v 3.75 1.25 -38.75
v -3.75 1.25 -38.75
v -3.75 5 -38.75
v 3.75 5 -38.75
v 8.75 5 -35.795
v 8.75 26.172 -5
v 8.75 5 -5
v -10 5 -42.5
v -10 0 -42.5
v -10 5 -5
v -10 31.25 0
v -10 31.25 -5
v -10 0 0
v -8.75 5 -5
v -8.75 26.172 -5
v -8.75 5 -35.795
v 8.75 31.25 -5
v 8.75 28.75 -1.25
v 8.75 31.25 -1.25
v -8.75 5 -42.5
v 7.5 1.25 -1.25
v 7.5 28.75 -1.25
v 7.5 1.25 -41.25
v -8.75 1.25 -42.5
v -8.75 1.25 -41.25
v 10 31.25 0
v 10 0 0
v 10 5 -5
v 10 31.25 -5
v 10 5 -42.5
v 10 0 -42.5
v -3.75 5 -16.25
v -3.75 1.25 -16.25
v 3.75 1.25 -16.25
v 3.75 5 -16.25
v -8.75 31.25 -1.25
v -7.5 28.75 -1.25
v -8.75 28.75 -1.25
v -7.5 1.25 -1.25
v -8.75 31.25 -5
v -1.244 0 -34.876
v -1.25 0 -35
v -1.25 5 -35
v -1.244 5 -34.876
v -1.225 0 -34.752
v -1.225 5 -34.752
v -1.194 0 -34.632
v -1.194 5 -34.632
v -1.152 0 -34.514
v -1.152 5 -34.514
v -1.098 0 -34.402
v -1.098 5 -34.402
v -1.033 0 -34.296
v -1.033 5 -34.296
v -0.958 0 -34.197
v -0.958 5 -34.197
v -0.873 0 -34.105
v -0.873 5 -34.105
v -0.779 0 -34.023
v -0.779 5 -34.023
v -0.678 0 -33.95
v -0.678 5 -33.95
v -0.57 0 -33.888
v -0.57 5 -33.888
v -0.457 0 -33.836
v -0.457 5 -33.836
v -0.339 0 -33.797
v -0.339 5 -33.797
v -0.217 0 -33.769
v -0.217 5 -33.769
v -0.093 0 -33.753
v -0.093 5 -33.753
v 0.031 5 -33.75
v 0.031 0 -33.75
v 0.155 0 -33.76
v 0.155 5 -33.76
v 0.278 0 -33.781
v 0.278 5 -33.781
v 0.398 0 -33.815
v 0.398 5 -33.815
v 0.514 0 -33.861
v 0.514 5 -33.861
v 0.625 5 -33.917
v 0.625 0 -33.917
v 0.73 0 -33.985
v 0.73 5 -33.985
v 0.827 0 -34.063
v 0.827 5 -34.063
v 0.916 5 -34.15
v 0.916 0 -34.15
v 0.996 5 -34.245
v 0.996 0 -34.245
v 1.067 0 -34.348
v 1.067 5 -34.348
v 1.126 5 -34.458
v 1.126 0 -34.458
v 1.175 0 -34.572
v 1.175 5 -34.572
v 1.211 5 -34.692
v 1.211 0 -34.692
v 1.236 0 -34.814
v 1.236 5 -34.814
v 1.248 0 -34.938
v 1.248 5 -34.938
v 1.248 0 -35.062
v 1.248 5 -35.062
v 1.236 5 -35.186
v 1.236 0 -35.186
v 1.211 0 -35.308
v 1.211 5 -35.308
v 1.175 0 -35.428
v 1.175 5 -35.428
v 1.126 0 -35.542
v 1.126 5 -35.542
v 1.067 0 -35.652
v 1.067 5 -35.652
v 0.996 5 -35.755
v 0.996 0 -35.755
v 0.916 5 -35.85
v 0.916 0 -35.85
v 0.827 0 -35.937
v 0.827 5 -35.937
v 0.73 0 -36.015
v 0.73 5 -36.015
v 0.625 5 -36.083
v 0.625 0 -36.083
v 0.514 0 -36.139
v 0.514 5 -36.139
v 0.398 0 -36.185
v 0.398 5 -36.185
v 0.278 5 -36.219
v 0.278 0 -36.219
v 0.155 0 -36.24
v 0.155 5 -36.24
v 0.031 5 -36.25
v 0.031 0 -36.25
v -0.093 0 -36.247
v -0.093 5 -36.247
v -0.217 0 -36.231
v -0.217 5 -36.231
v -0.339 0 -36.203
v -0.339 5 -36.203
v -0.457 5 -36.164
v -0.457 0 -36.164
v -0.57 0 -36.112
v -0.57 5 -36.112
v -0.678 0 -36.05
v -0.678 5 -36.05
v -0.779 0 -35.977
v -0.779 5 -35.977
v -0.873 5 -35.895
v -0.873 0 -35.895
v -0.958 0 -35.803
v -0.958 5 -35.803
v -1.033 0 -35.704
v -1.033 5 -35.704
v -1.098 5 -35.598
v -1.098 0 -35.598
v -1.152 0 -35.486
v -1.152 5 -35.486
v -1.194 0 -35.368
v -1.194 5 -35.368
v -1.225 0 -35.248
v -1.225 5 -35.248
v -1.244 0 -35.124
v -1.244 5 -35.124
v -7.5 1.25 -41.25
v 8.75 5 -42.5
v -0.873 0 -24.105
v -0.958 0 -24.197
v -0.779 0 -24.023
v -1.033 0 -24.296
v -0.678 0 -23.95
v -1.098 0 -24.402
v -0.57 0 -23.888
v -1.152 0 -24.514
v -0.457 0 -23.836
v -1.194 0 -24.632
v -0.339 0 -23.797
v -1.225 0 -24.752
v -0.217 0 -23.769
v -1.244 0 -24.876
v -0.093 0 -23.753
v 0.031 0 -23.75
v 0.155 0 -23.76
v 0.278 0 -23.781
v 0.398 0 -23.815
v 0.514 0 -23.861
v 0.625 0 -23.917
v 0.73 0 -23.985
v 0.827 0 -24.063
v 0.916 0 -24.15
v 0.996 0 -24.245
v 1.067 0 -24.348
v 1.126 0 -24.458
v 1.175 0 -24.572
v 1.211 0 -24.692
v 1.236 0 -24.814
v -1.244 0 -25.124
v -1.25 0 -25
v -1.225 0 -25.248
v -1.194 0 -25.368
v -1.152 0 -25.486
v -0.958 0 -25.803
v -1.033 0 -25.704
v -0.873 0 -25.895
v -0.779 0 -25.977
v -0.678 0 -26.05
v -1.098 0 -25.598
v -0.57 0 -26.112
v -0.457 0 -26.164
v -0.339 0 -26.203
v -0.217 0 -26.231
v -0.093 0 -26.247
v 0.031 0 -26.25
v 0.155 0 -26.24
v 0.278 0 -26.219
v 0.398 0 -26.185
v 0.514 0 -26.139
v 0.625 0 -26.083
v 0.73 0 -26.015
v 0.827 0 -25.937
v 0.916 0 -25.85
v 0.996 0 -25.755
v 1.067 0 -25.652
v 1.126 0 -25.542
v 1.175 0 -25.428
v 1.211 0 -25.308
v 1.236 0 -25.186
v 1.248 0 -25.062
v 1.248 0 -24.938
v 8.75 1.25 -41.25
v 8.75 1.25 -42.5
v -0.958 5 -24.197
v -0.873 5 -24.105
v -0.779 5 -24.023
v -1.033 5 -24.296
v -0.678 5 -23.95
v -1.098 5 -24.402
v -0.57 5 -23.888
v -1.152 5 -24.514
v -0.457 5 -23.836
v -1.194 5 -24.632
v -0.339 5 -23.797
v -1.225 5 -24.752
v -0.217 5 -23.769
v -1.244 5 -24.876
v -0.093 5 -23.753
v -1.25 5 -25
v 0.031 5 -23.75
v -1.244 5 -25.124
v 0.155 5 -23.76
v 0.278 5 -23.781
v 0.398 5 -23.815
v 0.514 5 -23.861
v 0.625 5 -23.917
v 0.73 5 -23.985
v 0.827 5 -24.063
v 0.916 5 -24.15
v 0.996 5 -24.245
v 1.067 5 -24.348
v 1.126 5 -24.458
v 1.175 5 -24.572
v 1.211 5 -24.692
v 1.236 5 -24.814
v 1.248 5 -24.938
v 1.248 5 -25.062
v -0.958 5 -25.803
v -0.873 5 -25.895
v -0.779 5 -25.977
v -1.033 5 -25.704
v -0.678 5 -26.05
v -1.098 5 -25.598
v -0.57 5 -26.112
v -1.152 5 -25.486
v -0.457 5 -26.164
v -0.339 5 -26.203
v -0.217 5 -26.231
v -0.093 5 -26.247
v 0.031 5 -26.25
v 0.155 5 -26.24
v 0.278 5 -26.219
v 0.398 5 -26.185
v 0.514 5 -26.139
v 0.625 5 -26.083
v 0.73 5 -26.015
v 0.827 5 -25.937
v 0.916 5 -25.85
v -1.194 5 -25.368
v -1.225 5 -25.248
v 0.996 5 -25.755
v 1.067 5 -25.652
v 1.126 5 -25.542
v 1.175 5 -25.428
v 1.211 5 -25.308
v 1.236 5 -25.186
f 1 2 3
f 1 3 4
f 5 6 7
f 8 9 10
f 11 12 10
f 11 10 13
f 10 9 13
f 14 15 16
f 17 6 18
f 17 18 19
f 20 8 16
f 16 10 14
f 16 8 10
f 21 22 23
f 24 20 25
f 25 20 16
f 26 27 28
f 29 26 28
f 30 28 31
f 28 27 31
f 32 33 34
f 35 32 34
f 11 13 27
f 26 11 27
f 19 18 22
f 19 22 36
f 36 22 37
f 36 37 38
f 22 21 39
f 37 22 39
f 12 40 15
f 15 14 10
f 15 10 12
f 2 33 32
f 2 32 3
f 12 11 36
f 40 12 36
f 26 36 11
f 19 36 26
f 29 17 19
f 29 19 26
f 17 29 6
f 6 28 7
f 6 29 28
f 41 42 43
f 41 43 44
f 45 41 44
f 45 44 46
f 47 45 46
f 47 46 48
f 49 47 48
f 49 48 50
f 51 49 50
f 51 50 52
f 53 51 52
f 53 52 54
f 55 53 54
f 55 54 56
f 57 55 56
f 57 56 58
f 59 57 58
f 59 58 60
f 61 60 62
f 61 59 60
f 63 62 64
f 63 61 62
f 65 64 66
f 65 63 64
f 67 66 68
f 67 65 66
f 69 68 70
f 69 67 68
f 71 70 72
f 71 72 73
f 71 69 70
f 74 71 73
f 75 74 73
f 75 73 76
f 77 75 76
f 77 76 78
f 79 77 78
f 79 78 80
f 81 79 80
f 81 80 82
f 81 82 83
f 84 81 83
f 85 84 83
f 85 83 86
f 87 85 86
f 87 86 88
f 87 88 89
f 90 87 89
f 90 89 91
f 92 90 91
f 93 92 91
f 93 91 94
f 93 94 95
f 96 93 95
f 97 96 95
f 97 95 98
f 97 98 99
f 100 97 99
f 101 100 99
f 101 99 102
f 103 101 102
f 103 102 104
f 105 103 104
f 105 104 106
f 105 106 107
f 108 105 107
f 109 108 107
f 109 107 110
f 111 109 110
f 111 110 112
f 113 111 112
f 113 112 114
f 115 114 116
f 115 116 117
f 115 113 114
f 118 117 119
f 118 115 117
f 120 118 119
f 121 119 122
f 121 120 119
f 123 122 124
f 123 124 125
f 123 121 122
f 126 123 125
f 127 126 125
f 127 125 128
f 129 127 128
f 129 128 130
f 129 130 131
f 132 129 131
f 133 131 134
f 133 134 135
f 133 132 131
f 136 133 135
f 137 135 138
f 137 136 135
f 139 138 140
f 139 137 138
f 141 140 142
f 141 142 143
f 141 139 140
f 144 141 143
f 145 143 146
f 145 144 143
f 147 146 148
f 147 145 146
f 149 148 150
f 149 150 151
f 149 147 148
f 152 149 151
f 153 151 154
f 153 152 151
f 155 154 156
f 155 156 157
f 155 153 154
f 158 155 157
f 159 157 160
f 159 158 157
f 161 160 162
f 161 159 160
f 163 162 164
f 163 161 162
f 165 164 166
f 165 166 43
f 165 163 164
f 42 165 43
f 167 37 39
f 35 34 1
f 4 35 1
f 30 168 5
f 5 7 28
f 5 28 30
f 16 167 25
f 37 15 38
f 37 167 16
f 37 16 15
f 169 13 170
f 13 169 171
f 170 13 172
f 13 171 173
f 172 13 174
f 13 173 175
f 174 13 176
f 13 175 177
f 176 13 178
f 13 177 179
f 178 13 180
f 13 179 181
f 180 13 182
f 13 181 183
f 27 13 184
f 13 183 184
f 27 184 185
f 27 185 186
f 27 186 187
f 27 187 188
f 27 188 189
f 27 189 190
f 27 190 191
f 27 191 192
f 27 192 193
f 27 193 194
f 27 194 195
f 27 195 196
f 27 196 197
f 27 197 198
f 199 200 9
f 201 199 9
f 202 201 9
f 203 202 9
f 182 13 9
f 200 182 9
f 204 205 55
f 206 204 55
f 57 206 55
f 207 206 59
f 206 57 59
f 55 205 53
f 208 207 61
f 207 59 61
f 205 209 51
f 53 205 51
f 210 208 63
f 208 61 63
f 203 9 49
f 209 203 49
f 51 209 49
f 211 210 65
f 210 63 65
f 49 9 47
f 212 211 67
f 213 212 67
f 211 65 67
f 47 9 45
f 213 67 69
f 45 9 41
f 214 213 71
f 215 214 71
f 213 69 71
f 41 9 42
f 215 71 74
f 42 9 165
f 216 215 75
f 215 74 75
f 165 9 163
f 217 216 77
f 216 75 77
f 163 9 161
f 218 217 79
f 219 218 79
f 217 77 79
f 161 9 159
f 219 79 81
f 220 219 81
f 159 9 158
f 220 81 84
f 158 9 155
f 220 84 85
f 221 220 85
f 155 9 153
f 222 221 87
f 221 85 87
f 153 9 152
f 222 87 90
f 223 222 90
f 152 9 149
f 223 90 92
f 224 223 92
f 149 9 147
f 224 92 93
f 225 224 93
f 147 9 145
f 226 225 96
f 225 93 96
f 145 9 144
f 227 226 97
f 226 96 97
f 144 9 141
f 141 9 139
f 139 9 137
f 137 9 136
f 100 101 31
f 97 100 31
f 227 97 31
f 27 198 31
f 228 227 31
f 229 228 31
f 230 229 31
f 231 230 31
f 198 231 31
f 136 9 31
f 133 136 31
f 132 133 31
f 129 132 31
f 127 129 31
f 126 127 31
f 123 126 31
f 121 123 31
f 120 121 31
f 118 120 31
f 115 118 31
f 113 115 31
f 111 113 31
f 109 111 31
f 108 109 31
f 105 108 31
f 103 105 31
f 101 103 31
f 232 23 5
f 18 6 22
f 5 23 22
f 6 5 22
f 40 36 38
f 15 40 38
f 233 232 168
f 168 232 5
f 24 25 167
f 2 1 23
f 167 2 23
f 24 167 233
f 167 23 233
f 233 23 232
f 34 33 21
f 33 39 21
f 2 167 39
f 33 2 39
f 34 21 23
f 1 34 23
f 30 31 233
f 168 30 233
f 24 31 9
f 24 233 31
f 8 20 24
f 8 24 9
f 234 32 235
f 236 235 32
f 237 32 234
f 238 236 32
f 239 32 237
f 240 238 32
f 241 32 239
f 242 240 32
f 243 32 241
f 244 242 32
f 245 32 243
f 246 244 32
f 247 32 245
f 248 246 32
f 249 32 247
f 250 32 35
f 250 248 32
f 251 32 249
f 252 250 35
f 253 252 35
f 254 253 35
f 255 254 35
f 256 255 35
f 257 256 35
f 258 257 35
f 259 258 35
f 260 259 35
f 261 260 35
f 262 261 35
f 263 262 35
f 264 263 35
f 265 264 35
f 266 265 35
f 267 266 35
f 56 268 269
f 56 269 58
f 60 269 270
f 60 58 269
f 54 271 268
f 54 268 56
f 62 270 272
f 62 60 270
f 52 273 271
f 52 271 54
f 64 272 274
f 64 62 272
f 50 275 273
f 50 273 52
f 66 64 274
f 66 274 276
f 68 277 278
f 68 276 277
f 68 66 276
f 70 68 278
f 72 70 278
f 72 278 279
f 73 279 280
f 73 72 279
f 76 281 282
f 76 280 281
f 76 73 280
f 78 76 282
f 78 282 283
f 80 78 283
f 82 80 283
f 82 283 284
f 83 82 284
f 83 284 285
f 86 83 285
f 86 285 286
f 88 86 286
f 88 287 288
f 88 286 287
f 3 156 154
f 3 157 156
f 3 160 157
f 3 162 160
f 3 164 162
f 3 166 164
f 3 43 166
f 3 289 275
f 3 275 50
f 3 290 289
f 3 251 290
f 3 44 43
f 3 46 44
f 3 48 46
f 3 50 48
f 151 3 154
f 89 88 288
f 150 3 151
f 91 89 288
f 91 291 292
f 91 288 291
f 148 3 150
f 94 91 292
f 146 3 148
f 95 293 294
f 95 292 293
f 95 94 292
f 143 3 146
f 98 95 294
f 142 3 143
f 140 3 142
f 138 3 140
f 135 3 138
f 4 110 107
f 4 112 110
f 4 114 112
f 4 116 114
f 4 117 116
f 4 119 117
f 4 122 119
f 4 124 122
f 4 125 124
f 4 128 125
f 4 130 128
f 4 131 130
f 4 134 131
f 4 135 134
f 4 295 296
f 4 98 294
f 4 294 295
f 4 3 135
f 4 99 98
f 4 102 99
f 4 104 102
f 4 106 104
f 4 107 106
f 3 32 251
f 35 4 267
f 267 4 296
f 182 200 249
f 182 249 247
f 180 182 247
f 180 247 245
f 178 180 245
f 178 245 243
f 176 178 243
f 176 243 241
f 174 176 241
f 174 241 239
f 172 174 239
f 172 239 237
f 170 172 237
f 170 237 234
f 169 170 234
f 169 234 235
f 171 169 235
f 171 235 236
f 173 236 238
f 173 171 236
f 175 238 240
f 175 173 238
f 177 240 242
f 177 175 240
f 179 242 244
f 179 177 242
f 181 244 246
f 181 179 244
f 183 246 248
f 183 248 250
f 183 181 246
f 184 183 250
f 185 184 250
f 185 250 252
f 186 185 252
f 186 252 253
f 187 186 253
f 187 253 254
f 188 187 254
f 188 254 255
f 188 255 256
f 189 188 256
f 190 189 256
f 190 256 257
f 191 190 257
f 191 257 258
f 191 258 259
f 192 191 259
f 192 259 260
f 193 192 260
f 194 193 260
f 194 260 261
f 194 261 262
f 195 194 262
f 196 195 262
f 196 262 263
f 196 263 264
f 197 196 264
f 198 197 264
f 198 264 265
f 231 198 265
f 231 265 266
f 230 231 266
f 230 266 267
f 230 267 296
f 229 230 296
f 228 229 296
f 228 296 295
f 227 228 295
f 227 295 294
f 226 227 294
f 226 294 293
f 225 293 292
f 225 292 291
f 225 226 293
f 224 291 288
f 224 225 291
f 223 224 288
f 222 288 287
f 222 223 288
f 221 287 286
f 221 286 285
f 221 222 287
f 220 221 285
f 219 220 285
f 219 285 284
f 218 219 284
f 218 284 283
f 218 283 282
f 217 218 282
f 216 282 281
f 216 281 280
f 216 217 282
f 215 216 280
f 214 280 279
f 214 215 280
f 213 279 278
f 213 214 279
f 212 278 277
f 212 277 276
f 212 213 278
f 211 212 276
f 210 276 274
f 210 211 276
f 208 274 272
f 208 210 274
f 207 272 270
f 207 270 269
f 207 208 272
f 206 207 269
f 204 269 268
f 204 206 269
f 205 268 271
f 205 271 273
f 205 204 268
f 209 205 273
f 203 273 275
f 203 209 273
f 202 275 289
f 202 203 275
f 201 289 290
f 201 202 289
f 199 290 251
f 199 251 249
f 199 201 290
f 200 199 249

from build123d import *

# Parameters (mm, degrees)
BOSS_EXTRUDE1_DEPTH     = 31.25
BOSS_EXTRUDE2_DEPTH     = 41.25
BOSS_EXTRUDE3_DEPTH     = 1.25
SKETCH6_W               = 7.5
SKETCH6_H               = 22.5
SKETCH6_R               = 1.25
BOSS_EXTRUDE4_DEPTH     = 3.75
CUT_EXTRUDE1_DEPTH      = 53.974050251
CUT_EXTRUDE1_DEPTH_BACK = 53.974050251
SKETCH6_2_R             = 1.25


with BuildPart() as part:
    # Sketch1 → Boss-Extrude1 (new body)
    with BuildSketch(Plane(origin=(0, 0, 0), x_dir=(1, 0, 0), z_dir=(0, 1, 0))):
        Polygon((-10, 0), (10, 0), (10, 5), (8.75, 5), (8.75, 1.25), (-8.75, 1.25), (-8.75, 5), (-10, 5), align=None)
    extrude(amount=BOSS_EXTRUDE1_DEPTH)

    # Sketch2 → Boss-Extrude2 (add)
    with BuildSketch(Plane(origin=(0, 0, -1.25), x_dir=(-1, 0, 0), z_dir=(0, 0, -1))):
        Polygon((-10, 5), (-10, 0), (10, 0), (10, 5), (8.75, 5), (8.75, 1.25), (-8.75, 1.25), (-8.75, 5), align=None)
    extrude(amount=BOSS_EXTRUDE2_DEPTH)

    # Sketch4 → Boss-Extrude3 (add)
    with BuildSketch(Plane(origin=(7.5, 0, 0), x_dir=(0, 0, -1), z_dir=(1, 0, 0))):
        Polygon((1.25, 28.75), (1.25, 1.25), (41.25, 1.25), align=None)
    boss_extrude3 = extrude(amount=BOSS_EXTRUDE3_DEPTH)

    # Mirror1: Boss-Extrude3 across plane
    add(boss_extrude3.mirror(Plane(origin=(0, 0, 0), x_dir=(0, 0, 1), z_dir=(1, 0, 0))))

    # Sketch6 → Boss-Extrude4 (add)
    with BuildSketch(Plane(origin=(0, 1.25, 0), x_dir=(1, 0, 0), z_dir=(0, 1, 0))):
        with Locations((0, 27.5)):
            Rectangle(SKETCH6_W, SKETCH6_H)
        with Locations((0, 35)):
            Circle(SKETCH6_R, mode=Mode.SUBTRACT)
        with Locations((0, 25)):
            Circle(SKETCH6_R, mode=Mode.SUBTRACT)
    extrude(amount=BOSS_EXTRUDE4_DEPTH)

    # Sketch6<2> → Cut-Extrude1 (cut, two sides: drawn at the far end of the back side and taken through both)
    with BuildSketch(Plane(origin=(0, 1.25, 0), x_dir=(1, 0, 0), z_dir=(0, 1, 0)).offset(-CUT_EXTRUDE1_DEPTH_BACK)):
        with Locations((0, 35)):
            Circle(SKETCH6_2_R)
        with Locations((0, 25)):
            Circle(SKETCH6_2_R)
    extrude(amount=CUT_EXTRUDE1_DEPTH + CUT_EXTRUDE1_DEPTH_BACK, mode=Mode.SUBTRACT)


solid = part.part
